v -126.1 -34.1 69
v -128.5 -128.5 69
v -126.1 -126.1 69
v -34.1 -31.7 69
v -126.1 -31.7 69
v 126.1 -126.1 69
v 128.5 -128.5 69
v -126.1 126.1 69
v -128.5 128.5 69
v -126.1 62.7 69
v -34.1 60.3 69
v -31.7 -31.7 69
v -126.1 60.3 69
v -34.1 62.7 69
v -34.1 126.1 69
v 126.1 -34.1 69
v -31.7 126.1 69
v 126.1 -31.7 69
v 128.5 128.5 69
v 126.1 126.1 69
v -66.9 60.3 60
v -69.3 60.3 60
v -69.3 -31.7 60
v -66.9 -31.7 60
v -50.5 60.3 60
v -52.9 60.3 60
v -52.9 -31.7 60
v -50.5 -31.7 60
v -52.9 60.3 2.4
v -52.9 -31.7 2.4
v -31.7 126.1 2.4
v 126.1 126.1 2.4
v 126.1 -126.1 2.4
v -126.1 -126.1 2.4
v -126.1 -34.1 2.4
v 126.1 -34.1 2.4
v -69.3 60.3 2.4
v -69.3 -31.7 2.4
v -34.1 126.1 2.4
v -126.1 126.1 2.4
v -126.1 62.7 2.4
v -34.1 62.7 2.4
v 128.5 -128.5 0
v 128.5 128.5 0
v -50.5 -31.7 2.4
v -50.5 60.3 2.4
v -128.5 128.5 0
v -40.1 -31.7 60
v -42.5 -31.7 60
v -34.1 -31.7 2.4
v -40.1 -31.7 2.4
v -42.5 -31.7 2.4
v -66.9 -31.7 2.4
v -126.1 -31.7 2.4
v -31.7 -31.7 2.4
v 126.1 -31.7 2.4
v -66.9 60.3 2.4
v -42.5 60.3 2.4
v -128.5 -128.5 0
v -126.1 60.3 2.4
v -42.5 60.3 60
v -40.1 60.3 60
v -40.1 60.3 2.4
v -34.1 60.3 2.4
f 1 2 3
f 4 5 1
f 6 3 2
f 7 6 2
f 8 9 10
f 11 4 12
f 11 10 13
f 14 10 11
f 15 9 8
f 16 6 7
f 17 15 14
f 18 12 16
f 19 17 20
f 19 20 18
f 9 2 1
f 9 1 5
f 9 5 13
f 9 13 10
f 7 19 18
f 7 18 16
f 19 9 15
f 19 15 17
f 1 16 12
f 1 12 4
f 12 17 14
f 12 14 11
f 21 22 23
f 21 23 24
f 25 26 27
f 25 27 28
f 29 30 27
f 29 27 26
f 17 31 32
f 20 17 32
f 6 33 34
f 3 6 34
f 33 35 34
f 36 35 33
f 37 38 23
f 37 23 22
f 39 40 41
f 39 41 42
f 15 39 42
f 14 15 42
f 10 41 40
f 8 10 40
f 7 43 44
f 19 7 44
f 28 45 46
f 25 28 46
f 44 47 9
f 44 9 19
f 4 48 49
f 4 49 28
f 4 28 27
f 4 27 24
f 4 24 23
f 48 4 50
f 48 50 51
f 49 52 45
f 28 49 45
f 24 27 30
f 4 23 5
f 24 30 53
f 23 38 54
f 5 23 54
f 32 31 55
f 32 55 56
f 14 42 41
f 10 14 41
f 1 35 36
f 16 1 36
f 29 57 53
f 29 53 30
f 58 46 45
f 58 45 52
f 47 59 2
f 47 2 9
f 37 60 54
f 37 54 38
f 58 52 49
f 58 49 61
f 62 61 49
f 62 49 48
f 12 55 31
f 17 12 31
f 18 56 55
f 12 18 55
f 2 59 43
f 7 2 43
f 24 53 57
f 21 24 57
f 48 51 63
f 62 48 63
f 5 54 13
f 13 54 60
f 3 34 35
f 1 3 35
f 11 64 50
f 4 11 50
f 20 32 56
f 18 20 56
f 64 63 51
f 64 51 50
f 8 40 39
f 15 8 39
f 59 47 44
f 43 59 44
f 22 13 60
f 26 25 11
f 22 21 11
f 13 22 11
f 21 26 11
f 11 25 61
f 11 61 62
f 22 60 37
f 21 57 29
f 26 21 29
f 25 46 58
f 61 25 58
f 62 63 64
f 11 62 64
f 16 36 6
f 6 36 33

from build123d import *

# Parameters (mm, degrees)
F0_W     = 92
F0_H     = 63.4
F1_DEPTH = 2.4
F0_W_2   = 56.8
F0_H_2   = 92
F0_W_3   = 14
F0_W_4   = 8
F0_W_5   = 6
F0_W_6   = 252.2
F0_W_7   = 257
F0_H_3   = 257
F2_DEPTH = 69
F0_W_8   = 2.4
F3_DEPTH = 60


with BuildPart() as f1:
    # F0 (on Top) → F1 (new body)
    with BuildSketch(Plane.XY):
        with Locations((-80.1, 94.4)):
            Rectangle(F0_W, F0_H)
    extrude(amount=F1_DEPTH)



with BuildPart() as f1b:
    # F0 (on Top) → F1, piece 2 (new body)
    with BuildSketch(Plane.XY):
        with Locations((-97.7, 14.3)):
            Rectangle(F0_W_2, F0_H_2)
    extrude(amount=F1_DEPTH)


with BuildPart() as f1c:
    # F0 (on Top) → F1, piece 3 (new body)
    with BuildSketch(Plane.XY):
        with Locations((-59.9, 14.3)):
            Rectangle(F0_W_3, F0_H_2)
    extrude(amount=F1_DEPTH)


with BuildPart() as f1d:
    # F0 (on Top) → F1, piece 4 (new body)
    with BuildSketch(Plane.XY):
        with Locations((-46.5, 14.3)):
            Rectangle(F0_W_4, F0_H_2)
    extrude(amount=F1_DEPTH)


with BuildPart() as f1e:
    # F0 (on Top) → F1, piece 5 (new body)
    with BuildSketch(Plane.XY):
        with Locations((-37.1, 14.3)):
            Rectangle(F0_W_5, F0_H_2)
    extrude(amount=F1_DEPTH)


with BuildPart() as f1f:
    # F0 (on Top) → F1, piece 6 (new body)
    with BuildSketch(Plane.XY):
        Polygon((126.1, 126.1), (-31.7, 126.1), (-31.7, 60.3), (-31.7, -31.7), (126.1, -31.7), align=None)
    extrude(amount=F1_DEPTH)


with BuildPart() as f1g:
    # F0 (on Top) → F1, piece 7 (new body)
    with BuildSketch(Plane.XY):
        with Locations((0, -80.1)):
            Rectangle(F0_W_6, F0_H_2)
    extrude(amount=F1_DEPTH)


with BuildPart() as f1_1:
    add(f1.part)

    add(f1b.part)  # F2 merges F1b

    add(f1c.part)  # F2 merges F1c

    add(f1d.part)  # F2 merges F1d

    add(f1e.part)  # F2 merges F1e

    add(f1f.part)  # F2 merges F1f

    add(f1g.part)  # F2 merges F1g
    # F0 (on Top) → F2 (join)
    with BuildSketch(Plane.XY):
        Rectangle(F0_W_7, F0_H_3)
        Polygon((-126.1, 62.7), (-126.1, 126.1), (-34.1, 126.1), (-31.7, 126.1), (126.1, 126.1), (126.1, -31.7), (126.1, -34.1), (126.1, -126.1), (-126.1, -126.1), (-126.1, -34.1), (-126.1, -31.7), (-126.1, 60.3), align=None, mode=Mode.SUBTRACT)
        Polygon((-69.3, -31.7), (-126.1, -31.7), (-126.1, -34.1), (126.1, -34.1), (126.1, -31.7), (-31.7, -31.7), (-34.1, -31.7), (-40.1, -31.7), (-42.5, -31.7), (-50.5, -31.7), (-52.9, -31.7), (-66.9, -31.7), align=None)
        Polygon((-34.1, 62.7), (-126.1, 62.7), (-126.1, 60.3), (-69.3, 60.3), (-66.9, 60.3), (-52.9, 60.3), (-50.5, 60.3), (-42.5, 60.3), (-40.1, 60.3), (-34.1, 60.3), align=None)
        Polygon((-31.7, 126.1), (-34.1, 126.1), (-34.1, 62.7), (-34.1, 60.3), (-34.1, -31.7), (-31.7, -31.7), (-31.7, 60.3), align=None)
    extrude(amount=F2_DEPTH)

    # F0 (on Top) → F3 (join)
    with BuildSketch(Plane.XY):
        with Locations((-68.1, 14.3)):
            Rectangle(F0_W_8, F0_H_2)
        with Locations((-51.7, 14.3)):
            Rectangle(F0_W_8, F0_H_2)
        with Locations((-41.3, 14.3)):
            Rectangle(F0_W_8, F0_H_2)
    extrude(amount=F3_DEPTH)


solid = f1_1.part
